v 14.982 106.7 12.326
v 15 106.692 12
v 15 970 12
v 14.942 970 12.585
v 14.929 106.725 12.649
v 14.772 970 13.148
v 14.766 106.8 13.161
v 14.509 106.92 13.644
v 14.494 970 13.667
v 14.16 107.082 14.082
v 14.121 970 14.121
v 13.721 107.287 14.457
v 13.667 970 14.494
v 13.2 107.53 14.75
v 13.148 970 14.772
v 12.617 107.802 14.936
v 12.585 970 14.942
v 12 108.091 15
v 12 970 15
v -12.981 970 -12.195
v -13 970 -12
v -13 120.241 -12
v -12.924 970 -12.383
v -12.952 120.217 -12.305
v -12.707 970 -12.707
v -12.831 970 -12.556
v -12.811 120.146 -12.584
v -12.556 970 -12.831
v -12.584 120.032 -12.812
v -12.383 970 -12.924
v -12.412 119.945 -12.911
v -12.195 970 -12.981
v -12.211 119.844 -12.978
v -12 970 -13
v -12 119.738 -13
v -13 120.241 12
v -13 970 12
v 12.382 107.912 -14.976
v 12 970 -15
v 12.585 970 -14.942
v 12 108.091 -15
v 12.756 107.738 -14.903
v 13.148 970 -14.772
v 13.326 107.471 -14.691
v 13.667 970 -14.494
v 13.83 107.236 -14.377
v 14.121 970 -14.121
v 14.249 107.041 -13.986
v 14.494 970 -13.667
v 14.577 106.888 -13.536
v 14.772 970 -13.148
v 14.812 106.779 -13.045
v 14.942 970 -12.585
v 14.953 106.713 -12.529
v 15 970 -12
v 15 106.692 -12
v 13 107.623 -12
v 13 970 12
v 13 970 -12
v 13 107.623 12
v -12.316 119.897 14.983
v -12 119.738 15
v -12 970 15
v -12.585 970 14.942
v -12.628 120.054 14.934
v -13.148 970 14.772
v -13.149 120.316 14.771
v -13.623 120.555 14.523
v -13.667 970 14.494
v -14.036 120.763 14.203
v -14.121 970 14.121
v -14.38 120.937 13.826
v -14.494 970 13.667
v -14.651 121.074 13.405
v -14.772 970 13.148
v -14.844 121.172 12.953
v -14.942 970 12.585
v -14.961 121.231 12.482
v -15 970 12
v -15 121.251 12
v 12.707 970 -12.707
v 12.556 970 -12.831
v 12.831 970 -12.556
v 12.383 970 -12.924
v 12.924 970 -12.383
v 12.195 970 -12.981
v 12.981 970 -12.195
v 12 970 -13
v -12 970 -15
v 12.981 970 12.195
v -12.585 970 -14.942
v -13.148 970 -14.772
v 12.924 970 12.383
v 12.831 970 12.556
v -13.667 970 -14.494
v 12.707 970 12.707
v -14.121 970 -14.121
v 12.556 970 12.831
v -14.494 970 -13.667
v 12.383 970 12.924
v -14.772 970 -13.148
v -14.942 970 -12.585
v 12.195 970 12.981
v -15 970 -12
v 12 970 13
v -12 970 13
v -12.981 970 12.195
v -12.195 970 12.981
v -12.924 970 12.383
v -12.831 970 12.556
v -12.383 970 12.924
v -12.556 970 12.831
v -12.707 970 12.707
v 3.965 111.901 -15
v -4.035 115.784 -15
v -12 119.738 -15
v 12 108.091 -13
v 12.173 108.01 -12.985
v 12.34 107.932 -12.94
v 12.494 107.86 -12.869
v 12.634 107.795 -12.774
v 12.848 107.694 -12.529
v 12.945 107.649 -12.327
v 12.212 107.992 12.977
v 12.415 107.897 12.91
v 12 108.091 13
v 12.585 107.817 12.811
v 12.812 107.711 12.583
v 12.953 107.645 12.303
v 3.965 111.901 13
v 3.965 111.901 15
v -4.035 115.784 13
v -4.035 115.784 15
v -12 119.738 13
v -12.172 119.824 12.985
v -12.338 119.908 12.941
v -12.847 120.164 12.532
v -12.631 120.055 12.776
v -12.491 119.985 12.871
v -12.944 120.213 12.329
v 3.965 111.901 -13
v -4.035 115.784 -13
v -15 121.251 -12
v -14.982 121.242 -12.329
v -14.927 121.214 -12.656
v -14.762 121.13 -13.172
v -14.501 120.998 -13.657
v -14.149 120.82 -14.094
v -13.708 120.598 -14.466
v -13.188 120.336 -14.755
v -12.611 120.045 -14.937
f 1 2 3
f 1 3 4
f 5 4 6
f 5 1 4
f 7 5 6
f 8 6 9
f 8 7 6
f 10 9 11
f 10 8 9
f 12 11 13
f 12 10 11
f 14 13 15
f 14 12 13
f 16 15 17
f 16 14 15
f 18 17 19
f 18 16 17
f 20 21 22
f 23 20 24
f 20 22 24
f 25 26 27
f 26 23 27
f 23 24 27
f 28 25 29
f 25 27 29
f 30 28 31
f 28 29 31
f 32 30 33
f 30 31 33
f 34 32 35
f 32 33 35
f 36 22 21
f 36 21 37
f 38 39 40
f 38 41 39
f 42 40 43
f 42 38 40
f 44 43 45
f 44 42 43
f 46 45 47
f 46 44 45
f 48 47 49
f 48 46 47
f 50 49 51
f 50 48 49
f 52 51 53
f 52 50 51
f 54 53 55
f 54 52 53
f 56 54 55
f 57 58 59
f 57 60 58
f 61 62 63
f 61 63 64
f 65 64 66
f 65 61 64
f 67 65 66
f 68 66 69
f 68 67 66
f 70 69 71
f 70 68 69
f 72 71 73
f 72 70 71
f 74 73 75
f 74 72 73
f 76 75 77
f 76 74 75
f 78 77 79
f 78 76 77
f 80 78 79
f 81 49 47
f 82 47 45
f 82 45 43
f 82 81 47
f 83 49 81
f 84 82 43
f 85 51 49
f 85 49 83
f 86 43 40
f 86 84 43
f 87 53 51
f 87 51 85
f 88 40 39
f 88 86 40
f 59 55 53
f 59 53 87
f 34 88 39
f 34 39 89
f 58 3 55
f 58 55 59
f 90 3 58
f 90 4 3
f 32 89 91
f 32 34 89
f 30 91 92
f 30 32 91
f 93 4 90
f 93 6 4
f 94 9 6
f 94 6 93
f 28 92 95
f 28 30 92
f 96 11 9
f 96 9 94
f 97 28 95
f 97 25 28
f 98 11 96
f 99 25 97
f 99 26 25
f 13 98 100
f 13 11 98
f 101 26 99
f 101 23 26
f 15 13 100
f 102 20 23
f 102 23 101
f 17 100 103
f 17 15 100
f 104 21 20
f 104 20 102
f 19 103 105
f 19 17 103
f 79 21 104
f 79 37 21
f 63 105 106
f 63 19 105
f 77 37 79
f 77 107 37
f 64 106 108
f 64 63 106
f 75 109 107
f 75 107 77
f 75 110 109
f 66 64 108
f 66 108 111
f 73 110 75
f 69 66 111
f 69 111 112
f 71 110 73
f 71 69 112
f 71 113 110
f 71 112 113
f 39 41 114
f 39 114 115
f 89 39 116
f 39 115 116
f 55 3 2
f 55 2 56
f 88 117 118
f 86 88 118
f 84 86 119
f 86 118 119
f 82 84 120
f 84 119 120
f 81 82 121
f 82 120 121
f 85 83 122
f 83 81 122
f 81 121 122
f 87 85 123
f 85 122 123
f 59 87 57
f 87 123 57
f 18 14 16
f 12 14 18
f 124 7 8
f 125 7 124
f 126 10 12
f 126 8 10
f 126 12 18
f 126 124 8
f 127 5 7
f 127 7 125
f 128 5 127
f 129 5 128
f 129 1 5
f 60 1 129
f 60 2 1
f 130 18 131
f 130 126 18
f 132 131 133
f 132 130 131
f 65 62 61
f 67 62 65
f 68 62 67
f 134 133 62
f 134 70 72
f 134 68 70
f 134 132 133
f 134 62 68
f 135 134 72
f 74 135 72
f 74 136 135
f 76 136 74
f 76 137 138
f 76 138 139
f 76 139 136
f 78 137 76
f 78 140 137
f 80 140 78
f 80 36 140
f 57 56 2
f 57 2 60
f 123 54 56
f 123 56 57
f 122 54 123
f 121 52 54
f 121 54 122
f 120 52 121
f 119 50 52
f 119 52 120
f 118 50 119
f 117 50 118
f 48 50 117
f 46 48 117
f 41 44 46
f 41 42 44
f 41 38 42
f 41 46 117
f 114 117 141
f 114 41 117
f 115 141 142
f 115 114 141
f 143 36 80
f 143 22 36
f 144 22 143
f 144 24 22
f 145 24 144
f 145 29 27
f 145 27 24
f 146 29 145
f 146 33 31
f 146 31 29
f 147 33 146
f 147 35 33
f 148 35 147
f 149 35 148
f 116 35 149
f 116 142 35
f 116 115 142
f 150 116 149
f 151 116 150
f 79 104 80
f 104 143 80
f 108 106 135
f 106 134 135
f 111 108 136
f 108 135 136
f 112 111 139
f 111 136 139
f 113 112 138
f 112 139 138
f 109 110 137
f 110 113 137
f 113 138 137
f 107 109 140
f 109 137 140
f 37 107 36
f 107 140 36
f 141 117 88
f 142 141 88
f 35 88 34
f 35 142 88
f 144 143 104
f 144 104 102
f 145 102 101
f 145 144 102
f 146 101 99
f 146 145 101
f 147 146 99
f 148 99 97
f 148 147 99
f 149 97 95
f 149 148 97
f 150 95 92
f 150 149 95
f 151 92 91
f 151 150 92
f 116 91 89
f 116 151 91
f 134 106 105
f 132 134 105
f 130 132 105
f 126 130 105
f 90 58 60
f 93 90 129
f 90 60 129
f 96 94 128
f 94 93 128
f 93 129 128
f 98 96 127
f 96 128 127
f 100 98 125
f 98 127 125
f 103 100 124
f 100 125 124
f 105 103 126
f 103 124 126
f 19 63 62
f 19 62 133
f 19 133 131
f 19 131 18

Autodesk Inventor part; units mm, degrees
ref_plane "YZ Plane" through (0, 0, 0) normal (1, 0, 0) x (0, 1, 0)
ref_plane "XZ Plane" through (0, 0, 0) normal (0, 1, 0) x (-1, 0, 0)
sketch "Sketch1" plane through (0, 0, 0) normal (0, 1, 0) x (-1, 0, 0)
  line L0 (-12, 14) -> (12, 14) construction
  line L1 (14, 12) -> (14, -12) construction
  line L2 (12, -14) -> (-12, -14) construction
  line L3 (-14, -12) -> (-14, 12) construction
  line L4 (-14, 14) -> (14, -14) construction
  line L5 (14, 14) -> (-14, -14) construction
  arc A0 (14, 12) -> (12, 14) centre (12, 12) ccw construction
  arc A1 (12, -14) -> (14, -12) centre (12, -12) ccw construction
  arc A2 (-14, -12) -> (-12, -14) centre (-12, -12) ccw construction
  arc A3 (-12, 14) -> (-14, 12) centre (-12, 12) ccw construction
  line L6 (-12, -15) -> (12, -15)
  arc A4 (12, -15) -> (15, -12) centre (12, -12) ccw
  line L7 (15, -12) -> (15, 12)
  arc A5 (15, 12) -> (12, 15) centre (12, 12) ccw
  line L8 (12, 15) -> (-12, 15)
  arc A6 (-12, 15) -> (-15, 12) centre (-12, 12) ccw
  line L9 (-15, 12) -> (-15, -12)
  arc A7 (-15, -12) -> (-12, -15) centre (-12, -12) ccw
  line L10 (13, -12) -> (13, 12)
  arc A8 (13, 12) -> (12, 13) centre (12, 12) ccw
  line L11 (12, 13) -> (-12, 13)
  arc A9 (-12, 13) -> (-13, 12) centre (-12, 12) ccw
  line L12 (-13, 12) -> (-13, -12)
  arc A10 (-13, -12) -> (-12, -13) centre (-12, -12) ccw
  line L13 (-12, -13) -> (12, -13)
  arc A11 (12, -13) -> (13, -12) centre (12, -12) ccw
  point P0 (0, 0)
  point P1 (0, 0)
  point P2 (0, 0)
  dimension "d10" = 2
  dimension "depth" = 30
  dimension "width" = 30
  dimension "thickness" = 2
extrude "Extrusion1" add sketch "Sketch1" along normal blind 970
ref_plane "Work Plane1" through (0, 485, 0) normal (0, -1, 0) x (1, 0, 0)
sketch "Sketch3" plane through (12, 0, -15) normal (0, 0, -1) x (-1, 0, 0)
  line L0 (12, -397) -> (12, 2382) construction
  circle A0 centre (-418, 1000) radius 985
  point P0 (12, 0)
  dimension "d29" = 1970
  dimension "d31" = 1000
  dimension "d34" = 430
extrude "Extrusion2" cut sketch "Sketch3" against normal through all keep common part
equation "\"d10\" = thickness"
properties part number "podest duzy profil 3" material "Steel"
